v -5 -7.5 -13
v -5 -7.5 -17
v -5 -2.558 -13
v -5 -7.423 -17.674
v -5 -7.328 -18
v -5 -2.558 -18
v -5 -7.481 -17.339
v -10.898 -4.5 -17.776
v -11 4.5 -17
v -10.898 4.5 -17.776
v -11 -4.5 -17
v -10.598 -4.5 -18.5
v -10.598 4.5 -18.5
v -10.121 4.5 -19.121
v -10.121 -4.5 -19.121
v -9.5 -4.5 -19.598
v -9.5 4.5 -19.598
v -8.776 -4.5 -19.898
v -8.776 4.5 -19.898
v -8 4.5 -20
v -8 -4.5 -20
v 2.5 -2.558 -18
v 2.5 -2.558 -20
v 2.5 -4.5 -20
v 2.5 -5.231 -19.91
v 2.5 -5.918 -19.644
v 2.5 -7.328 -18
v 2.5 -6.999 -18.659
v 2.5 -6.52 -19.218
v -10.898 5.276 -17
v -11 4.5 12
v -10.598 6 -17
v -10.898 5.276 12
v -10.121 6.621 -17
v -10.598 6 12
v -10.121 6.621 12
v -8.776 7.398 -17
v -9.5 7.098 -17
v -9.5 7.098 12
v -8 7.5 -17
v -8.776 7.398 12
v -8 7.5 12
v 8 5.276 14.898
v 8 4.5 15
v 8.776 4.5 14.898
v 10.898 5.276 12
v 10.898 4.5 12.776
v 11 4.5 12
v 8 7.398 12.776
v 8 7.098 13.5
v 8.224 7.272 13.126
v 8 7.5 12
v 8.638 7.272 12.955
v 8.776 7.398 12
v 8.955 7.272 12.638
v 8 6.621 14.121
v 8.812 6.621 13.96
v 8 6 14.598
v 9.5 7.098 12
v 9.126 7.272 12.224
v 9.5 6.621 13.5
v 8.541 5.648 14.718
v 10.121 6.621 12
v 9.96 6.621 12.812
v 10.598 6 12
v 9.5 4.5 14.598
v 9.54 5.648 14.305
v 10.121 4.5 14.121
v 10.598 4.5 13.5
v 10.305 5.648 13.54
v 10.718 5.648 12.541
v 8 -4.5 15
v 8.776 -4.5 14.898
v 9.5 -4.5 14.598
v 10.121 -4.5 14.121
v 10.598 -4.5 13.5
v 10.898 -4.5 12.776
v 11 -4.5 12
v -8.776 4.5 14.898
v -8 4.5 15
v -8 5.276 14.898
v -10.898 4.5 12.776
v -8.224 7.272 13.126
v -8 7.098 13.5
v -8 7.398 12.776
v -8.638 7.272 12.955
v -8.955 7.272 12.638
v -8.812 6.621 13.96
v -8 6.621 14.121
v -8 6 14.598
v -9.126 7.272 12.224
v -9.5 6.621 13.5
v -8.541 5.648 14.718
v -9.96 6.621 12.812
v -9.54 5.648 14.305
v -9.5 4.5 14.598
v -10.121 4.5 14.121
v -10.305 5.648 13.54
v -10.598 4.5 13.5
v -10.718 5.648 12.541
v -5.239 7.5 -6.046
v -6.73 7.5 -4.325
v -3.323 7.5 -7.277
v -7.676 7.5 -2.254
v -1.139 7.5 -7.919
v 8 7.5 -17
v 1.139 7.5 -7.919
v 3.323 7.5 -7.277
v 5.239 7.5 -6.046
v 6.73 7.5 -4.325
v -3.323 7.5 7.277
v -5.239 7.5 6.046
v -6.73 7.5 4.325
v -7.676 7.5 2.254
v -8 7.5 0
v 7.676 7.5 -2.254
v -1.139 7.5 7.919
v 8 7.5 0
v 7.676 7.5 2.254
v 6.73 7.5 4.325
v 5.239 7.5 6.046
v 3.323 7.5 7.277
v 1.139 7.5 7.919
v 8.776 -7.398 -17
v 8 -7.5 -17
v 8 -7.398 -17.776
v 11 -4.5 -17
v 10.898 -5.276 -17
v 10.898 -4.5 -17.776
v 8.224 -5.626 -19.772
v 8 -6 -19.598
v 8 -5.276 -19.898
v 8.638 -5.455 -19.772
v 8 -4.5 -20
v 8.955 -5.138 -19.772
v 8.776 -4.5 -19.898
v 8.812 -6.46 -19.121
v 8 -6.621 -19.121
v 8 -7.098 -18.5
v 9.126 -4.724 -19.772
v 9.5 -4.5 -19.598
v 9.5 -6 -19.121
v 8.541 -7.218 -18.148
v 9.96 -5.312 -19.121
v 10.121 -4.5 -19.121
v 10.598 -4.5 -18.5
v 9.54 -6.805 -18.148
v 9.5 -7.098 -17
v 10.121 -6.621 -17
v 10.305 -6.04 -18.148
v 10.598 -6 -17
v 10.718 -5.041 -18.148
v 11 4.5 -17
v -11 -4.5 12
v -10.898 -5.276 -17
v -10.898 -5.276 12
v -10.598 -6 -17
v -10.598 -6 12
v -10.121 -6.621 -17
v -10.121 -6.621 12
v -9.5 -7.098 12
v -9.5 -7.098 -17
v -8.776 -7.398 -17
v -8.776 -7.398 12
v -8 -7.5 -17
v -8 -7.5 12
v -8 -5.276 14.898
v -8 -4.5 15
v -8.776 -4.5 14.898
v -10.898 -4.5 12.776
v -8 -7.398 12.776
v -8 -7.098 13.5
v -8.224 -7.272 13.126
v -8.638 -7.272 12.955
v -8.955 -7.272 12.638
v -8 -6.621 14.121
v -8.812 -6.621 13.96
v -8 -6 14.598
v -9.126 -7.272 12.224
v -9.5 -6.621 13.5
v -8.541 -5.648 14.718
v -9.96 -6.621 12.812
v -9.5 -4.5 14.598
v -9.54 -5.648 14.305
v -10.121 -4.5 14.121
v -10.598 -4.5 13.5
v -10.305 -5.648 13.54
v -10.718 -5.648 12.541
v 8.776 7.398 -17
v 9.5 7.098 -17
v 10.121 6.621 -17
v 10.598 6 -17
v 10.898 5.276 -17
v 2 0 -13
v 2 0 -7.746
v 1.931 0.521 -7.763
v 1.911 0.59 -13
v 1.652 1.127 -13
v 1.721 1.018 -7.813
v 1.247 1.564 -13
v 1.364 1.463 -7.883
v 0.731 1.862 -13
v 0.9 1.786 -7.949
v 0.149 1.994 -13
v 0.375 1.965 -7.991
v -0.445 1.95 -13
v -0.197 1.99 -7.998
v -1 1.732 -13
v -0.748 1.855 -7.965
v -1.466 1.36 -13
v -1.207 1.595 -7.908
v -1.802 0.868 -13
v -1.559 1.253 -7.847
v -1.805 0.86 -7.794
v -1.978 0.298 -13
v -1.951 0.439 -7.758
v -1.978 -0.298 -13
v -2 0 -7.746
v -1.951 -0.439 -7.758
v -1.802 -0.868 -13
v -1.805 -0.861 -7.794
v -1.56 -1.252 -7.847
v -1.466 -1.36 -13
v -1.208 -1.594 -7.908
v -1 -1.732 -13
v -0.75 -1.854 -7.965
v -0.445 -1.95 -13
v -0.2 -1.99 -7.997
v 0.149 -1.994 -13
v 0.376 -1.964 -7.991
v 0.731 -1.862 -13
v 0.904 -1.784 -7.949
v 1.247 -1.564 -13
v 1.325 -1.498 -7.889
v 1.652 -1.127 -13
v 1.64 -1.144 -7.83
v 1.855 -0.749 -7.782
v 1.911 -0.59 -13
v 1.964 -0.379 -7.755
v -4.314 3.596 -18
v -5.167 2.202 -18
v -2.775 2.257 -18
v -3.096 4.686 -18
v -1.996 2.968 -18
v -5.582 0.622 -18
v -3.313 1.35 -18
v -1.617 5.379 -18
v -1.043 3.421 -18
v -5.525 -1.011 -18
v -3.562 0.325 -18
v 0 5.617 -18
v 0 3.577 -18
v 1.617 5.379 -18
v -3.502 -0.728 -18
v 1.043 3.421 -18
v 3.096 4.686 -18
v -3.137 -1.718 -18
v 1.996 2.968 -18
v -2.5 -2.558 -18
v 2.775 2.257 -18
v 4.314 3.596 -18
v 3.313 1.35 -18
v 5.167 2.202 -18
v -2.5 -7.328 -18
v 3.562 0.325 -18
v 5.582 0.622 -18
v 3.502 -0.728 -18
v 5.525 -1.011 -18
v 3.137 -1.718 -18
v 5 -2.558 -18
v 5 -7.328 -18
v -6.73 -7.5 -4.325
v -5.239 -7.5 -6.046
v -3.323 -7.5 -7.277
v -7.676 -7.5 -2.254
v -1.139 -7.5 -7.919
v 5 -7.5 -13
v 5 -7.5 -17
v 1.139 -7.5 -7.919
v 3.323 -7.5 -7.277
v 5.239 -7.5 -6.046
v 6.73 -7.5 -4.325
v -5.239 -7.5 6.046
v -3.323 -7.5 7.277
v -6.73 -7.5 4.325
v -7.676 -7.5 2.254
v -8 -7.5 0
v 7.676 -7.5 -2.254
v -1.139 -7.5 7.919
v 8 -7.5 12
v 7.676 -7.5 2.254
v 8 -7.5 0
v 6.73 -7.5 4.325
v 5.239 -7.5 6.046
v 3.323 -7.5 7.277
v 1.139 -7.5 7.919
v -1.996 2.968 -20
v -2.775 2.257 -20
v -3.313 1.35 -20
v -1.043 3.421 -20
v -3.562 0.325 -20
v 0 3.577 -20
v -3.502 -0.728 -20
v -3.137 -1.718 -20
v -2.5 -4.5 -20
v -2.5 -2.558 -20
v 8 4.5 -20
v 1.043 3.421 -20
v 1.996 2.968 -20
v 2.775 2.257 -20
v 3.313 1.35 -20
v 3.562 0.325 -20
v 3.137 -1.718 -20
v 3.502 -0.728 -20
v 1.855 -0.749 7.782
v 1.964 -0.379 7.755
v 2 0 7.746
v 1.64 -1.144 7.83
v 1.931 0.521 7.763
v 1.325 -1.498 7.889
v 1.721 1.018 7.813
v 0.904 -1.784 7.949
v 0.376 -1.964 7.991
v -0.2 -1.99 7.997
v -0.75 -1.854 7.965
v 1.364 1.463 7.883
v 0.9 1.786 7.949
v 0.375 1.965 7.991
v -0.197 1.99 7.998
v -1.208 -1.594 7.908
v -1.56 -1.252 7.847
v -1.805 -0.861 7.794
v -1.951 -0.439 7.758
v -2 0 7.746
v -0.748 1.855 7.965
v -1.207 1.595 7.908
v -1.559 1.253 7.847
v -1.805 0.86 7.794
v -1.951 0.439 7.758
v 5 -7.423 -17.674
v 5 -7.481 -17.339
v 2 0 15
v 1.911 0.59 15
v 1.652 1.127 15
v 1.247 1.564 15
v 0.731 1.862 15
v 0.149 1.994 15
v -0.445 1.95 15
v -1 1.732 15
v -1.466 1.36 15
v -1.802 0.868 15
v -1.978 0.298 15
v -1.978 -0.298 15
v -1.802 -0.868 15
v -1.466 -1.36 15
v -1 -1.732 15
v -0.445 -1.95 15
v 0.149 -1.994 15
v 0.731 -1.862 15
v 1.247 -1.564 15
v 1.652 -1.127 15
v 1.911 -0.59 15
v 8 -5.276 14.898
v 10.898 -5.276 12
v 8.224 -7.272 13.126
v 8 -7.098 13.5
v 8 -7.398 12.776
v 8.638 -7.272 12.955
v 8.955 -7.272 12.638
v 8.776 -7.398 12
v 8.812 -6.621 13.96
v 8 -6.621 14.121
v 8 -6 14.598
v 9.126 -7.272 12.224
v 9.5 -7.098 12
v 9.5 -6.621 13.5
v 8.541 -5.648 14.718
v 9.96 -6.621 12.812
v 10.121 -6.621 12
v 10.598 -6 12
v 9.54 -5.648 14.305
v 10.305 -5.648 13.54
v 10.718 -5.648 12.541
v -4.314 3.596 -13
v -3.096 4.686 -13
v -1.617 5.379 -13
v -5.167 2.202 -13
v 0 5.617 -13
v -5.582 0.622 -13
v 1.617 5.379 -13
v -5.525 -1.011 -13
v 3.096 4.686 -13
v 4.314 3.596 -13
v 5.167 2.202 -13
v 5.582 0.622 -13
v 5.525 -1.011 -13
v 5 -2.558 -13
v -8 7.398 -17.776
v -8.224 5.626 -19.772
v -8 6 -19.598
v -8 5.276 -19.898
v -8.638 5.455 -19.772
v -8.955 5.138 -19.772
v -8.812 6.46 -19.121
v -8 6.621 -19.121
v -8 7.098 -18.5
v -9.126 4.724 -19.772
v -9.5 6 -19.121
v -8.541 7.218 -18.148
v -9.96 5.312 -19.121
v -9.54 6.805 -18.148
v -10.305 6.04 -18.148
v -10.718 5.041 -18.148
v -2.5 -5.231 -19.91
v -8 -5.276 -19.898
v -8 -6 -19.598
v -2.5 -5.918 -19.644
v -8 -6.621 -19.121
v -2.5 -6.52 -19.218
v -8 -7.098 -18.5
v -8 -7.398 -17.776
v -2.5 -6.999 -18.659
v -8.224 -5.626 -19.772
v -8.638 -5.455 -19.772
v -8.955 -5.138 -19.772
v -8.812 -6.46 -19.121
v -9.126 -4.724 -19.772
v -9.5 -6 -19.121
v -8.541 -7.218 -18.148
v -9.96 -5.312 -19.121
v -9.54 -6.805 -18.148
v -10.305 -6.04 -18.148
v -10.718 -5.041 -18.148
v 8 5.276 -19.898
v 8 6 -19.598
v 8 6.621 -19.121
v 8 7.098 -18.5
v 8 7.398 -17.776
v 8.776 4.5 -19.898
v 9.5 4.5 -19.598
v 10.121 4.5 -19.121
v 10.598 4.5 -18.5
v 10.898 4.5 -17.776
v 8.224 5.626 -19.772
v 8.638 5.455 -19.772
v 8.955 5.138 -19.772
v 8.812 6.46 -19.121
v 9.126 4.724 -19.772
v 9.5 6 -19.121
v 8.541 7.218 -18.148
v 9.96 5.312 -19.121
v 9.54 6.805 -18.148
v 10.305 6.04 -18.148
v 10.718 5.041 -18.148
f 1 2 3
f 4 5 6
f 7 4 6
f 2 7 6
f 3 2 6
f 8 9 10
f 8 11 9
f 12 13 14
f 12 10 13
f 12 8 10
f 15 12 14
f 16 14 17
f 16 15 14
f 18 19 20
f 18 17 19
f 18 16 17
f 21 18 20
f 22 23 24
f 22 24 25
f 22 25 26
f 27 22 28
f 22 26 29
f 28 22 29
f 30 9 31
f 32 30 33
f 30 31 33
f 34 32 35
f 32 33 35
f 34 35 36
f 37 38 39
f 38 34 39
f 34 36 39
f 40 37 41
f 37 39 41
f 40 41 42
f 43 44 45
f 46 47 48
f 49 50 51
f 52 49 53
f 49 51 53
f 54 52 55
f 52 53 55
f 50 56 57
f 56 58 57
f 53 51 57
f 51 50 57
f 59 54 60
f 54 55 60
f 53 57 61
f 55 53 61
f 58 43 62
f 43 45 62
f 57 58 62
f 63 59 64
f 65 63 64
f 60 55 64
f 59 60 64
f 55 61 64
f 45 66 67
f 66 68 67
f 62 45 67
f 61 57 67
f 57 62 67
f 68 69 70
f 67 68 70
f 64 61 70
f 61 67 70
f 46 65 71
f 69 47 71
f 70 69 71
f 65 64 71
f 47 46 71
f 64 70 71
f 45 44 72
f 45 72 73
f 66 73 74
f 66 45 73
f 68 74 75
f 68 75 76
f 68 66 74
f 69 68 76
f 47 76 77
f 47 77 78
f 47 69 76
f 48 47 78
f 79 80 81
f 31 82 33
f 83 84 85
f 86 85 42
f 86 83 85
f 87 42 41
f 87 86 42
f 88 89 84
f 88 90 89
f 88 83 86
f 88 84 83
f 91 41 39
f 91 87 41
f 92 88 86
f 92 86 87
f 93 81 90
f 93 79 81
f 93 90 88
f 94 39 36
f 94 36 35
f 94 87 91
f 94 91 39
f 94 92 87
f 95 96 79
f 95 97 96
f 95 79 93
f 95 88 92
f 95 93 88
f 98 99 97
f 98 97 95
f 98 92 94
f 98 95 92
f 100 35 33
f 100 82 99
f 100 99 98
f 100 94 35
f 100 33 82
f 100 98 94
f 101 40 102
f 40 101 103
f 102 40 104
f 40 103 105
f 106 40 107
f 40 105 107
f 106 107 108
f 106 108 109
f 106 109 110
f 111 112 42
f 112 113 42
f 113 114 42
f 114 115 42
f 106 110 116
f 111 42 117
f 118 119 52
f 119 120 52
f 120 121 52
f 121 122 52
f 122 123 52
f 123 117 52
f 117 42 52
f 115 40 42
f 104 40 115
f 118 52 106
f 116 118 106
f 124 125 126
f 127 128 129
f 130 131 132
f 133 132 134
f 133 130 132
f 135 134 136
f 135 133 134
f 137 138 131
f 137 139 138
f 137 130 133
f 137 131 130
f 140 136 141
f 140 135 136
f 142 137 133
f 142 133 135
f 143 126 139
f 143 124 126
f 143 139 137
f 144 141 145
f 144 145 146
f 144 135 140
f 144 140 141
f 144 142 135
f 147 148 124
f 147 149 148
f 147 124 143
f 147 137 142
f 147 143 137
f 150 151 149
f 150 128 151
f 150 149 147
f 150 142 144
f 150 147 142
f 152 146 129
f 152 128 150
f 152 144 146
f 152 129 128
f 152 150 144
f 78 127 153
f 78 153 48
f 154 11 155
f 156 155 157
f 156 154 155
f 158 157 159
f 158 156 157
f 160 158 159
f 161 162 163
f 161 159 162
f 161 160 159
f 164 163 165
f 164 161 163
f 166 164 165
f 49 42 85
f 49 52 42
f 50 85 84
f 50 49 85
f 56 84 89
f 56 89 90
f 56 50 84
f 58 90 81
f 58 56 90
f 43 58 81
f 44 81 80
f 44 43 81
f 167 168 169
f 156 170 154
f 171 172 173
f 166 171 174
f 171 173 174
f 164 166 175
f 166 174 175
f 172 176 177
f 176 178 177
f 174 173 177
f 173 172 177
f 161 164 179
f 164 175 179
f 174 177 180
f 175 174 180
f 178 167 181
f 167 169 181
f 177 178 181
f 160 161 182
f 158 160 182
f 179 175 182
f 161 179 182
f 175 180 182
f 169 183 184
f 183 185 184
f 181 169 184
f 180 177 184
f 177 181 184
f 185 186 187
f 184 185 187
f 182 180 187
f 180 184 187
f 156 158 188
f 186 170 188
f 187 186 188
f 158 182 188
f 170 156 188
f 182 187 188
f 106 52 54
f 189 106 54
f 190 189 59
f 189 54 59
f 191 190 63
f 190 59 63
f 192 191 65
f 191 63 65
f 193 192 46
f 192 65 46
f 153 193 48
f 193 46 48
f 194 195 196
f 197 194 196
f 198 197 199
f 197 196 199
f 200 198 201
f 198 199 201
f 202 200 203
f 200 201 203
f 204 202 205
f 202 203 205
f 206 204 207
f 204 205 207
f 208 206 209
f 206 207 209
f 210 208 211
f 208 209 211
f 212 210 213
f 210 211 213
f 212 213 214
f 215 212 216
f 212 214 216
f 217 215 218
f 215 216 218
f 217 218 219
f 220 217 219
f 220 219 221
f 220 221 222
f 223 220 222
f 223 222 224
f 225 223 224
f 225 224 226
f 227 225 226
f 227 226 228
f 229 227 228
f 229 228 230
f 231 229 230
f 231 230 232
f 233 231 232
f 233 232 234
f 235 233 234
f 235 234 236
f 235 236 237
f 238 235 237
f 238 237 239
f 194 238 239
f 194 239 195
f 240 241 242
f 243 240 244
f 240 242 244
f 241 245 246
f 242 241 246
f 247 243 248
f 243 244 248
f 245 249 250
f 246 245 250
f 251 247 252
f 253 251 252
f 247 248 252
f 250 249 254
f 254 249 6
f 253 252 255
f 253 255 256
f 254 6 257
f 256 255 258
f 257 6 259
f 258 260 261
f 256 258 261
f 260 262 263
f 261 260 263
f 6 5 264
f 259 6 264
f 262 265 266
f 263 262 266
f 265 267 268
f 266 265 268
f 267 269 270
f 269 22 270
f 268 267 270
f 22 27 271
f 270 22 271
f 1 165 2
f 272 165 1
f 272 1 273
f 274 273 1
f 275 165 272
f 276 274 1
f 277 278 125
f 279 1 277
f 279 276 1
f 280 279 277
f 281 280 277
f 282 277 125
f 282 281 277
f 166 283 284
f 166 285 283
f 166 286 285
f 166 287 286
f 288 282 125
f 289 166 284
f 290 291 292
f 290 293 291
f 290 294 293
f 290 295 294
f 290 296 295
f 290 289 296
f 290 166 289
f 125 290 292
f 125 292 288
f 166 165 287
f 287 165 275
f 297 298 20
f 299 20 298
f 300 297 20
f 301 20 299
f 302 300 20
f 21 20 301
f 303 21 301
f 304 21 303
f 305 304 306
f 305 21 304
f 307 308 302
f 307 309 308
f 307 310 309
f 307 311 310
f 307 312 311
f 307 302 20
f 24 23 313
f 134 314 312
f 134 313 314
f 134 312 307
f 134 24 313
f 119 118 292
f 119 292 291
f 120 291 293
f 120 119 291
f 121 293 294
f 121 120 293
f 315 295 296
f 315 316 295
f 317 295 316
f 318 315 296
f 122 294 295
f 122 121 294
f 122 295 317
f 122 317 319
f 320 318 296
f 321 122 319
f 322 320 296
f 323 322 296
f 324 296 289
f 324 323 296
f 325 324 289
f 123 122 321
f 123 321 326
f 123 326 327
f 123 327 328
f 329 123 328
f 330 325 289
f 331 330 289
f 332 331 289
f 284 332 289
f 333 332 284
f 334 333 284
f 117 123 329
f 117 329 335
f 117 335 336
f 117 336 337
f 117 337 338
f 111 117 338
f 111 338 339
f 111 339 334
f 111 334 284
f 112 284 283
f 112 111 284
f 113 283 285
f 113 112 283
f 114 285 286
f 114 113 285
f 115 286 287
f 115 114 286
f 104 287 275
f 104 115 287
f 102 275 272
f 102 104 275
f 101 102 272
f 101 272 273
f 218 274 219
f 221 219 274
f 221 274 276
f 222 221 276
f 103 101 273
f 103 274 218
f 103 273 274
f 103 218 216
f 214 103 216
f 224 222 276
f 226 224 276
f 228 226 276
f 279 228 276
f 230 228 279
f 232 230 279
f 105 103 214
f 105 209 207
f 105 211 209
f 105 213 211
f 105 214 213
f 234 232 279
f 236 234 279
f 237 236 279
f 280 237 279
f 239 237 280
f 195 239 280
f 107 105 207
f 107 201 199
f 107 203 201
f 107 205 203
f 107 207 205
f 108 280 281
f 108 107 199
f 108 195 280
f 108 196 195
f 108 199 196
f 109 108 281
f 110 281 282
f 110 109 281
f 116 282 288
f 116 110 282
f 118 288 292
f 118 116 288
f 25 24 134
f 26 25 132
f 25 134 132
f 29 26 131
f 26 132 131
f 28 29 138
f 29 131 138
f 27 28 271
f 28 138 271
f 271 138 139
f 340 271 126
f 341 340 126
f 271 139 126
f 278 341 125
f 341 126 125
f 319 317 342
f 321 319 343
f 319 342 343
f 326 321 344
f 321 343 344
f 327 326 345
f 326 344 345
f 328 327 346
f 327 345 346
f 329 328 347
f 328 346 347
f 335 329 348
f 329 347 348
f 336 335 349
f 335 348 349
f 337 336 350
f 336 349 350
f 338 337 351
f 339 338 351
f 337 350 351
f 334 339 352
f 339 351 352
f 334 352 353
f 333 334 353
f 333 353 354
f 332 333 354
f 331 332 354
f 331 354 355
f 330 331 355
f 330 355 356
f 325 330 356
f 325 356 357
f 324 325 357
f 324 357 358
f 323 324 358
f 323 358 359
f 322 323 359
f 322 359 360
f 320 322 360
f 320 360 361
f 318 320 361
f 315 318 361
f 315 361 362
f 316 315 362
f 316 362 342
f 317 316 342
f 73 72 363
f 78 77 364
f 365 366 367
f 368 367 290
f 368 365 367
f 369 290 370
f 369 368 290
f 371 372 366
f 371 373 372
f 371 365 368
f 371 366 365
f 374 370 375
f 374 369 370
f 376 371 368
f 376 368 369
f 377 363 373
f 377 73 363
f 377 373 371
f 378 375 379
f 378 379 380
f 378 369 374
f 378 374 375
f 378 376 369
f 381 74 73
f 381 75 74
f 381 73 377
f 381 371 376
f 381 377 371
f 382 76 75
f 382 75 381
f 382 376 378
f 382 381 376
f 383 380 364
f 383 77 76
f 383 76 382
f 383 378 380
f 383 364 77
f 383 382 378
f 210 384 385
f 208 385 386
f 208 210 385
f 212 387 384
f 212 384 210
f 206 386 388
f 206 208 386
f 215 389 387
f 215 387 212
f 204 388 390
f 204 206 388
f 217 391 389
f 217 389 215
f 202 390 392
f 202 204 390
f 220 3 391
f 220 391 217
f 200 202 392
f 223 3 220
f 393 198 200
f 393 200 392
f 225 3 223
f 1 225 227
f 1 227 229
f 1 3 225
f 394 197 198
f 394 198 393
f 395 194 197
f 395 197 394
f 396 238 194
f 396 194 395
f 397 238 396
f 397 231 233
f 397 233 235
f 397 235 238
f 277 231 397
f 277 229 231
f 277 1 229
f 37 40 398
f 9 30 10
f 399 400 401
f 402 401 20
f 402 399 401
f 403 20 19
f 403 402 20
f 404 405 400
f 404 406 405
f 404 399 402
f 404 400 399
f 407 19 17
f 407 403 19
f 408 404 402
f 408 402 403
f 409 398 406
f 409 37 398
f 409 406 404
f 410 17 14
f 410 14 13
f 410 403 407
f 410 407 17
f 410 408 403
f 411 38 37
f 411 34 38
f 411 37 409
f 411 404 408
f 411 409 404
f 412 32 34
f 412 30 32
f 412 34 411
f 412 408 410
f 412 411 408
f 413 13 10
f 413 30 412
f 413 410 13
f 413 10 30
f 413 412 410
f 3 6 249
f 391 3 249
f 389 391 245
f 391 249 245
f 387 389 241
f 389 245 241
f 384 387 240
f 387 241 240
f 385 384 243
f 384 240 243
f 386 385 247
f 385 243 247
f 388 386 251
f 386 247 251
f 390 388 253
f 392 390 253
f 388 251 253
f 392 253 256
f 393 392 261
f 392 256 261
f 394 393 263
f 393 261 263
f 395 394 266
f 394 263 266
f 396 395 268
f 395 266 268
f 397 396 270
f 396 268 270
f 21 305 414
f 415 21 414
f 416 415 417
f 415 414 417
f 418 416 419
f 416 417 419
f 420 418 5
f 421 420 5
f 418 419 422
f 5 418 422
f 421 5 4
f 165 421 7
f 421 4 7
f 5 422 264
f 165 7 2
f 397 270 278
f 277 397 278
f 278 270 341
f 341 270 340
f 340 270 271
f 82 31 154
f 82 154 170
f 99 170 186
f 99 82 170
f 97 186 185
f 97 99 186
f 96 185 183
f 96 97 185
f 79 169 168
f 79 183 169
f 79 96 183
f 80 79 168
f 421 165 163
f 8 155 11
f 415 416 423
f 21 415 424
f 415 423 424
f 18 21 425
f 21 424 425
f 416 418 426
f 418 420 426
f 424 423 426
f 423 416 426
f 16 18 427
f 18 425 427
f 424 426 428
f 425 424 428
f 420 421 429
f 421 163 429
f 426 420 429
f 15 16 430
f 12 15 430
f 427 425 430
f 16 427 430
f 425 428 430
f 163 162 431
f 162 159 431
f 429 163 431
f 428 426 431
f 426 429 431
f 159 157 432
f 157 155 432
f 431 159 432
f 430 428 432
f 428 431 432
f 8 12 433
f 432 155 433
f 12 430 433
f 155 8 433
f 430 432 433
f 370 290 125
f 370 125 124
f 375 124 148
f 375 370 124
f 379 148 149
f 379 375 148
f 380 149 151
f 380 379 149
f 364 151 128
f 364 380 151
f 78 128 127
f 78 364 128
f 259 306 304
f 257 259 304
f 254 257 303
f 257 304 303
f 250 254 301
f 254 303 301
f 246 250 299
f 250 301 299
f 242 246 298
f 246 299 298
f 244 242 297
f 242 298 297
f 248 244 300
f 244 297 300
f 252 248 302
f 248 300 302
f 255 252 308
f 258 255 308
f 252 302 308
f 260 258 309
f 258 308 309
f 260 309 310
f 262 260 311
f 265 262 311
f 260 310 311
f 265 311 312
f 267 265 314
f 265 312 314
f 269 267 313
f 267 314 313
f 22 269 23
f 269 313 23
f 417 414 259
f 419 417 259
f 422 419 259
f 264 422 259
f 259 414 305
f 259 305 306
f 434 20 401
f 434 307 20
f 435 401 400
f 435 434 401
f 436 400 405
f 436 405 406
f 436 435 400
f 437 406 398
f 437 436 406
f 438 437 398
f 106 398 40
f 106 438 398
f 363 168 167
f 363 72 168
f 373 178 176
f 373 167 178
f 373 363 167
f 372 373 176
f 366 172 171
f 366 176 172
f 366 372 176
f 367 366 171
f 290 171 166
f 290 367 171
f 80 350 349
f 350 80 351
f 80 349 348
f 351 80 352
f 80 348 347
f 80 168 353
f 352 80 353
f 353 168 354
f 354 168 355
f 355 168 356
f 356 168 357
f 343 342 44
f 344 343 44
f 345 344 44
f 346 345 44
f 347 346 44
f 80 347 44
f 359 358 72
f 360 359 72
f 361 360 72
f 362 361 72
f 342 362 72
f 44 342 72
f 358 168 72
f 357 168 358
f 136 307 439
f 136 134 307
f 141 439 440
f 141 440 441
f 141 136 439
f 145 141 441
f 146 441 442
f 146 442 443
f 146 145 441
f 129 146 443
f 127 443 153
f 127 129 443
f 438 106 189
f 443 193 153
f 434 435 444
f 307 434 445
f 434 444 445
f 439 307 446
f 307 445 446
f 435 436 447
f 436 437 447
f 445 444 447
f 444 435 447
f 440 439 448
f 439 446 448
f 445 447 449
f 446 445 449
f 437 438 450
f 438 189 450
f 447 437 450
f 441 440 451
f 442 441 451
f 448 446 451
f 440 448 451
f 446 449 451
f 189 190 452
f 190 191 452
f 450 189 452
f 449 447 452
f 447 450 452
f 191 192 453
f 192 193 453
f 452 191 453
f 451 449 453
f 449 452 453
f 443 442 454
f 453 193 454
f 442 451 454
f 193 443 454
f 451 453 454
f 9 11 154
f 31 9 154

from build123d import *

# Parameters (mm, degrees)
F0_W     = 22
F0_H     = 35
F0_R     = 8
F1_DEPTH = 7.5
F3_DEPTH = 2
F6_DEPTH = 5
F7_R     = 2
F8_DEPTH = 35.001
F9_R     = 2.99999


# Not quite as in the source:
# - a fillet or chamfer is up to 0.001 mm smaller than in the source, because OpenCascade refuses the exact size


with BuildPart() as f1:
    # F0 (on Front) → F1 (new body, symmetric)
    with BuildSketch(Plane.XZ):
        with Locations((0, -2.5)):
            Rectangle(F0_W, F0_H)
        Circle(F0_R, mode=Mode.SUBTRACT)
    extrude(amount=F1_DEPTH, both=True)

    # F2 (on face) → F3 (cut)
    with BuildSketch(Plane(origin=(0, 0, -20), x_dir=(1, 0, 0), z_dir=(0, 0, -1))):
        with BuildLine():
            Line((2.5, 7.5), (-2.5, 7.5))
            Line((-2.5, 7.5), (-2.5, 2.5583377574))
            ThreePointArc((-2.5, 2.5583377574), (0, -3.5770227957), (2.5, 2.5583377574))
            Line((2.5, 2.5583377574), (2.5, 7.5))
        make_face()
    extrude(amount=-F3_DEPTH, mode=Mode.SUBTRACT)

    # F5 (on offset) → F6 (cut)
    with BuildSketch(Plane(origin=(0, 0, -18), x_dir=(1, 0, 0), z_dir=(0, 0, -1))):
        with BuildLine():
            Line((5, 7.5), (-5, 7.5))
            Line((-5, 7.5), (-5, 2.5583377574))
            ThreePointArc((-5, 2.5583377574), (0, -5.6165017654), (5, 2.5583377574))
            Line((5, 2.5583377574), (5, 7.5))
        make_face()
    extrude(amount=-F6_DEPTH, mode=Mode.SUBTRACT)

    # F7 (on face) → F8 (cut, through all)
    with BuildSketch(Plane.XY.offset(15)):
        Circle(F7_R)
    extrude(amount=-F8_DEPTH, mode=Mode.SUBTRACT)

    # F9 (radius 3 in the source; OpenCascade refuses exactly that, so slightly less here)
    f9_edges = [f1.edges().sort_by_distance(p)[0] for p in [
        (-11, 0, 15),
        (11, 0, 15),
        (0, -7.5, 15),
        (0, 7.5, 15),
        (11, -7.5, -2.5),
        (-11, -7.5, -2.5),
        (-11, 7.5, -2.5),
        (11, 7.5, -2.5),
        (0, 7.5, -20),
        (-6.75, -7.5, -20),
        (6.75, -7.5, -20),
        (-11, 0, -20),
        (11, 0, -20),
    ]]
    fillet(f9_edges, radius=F9_R)


solid = f1.part
